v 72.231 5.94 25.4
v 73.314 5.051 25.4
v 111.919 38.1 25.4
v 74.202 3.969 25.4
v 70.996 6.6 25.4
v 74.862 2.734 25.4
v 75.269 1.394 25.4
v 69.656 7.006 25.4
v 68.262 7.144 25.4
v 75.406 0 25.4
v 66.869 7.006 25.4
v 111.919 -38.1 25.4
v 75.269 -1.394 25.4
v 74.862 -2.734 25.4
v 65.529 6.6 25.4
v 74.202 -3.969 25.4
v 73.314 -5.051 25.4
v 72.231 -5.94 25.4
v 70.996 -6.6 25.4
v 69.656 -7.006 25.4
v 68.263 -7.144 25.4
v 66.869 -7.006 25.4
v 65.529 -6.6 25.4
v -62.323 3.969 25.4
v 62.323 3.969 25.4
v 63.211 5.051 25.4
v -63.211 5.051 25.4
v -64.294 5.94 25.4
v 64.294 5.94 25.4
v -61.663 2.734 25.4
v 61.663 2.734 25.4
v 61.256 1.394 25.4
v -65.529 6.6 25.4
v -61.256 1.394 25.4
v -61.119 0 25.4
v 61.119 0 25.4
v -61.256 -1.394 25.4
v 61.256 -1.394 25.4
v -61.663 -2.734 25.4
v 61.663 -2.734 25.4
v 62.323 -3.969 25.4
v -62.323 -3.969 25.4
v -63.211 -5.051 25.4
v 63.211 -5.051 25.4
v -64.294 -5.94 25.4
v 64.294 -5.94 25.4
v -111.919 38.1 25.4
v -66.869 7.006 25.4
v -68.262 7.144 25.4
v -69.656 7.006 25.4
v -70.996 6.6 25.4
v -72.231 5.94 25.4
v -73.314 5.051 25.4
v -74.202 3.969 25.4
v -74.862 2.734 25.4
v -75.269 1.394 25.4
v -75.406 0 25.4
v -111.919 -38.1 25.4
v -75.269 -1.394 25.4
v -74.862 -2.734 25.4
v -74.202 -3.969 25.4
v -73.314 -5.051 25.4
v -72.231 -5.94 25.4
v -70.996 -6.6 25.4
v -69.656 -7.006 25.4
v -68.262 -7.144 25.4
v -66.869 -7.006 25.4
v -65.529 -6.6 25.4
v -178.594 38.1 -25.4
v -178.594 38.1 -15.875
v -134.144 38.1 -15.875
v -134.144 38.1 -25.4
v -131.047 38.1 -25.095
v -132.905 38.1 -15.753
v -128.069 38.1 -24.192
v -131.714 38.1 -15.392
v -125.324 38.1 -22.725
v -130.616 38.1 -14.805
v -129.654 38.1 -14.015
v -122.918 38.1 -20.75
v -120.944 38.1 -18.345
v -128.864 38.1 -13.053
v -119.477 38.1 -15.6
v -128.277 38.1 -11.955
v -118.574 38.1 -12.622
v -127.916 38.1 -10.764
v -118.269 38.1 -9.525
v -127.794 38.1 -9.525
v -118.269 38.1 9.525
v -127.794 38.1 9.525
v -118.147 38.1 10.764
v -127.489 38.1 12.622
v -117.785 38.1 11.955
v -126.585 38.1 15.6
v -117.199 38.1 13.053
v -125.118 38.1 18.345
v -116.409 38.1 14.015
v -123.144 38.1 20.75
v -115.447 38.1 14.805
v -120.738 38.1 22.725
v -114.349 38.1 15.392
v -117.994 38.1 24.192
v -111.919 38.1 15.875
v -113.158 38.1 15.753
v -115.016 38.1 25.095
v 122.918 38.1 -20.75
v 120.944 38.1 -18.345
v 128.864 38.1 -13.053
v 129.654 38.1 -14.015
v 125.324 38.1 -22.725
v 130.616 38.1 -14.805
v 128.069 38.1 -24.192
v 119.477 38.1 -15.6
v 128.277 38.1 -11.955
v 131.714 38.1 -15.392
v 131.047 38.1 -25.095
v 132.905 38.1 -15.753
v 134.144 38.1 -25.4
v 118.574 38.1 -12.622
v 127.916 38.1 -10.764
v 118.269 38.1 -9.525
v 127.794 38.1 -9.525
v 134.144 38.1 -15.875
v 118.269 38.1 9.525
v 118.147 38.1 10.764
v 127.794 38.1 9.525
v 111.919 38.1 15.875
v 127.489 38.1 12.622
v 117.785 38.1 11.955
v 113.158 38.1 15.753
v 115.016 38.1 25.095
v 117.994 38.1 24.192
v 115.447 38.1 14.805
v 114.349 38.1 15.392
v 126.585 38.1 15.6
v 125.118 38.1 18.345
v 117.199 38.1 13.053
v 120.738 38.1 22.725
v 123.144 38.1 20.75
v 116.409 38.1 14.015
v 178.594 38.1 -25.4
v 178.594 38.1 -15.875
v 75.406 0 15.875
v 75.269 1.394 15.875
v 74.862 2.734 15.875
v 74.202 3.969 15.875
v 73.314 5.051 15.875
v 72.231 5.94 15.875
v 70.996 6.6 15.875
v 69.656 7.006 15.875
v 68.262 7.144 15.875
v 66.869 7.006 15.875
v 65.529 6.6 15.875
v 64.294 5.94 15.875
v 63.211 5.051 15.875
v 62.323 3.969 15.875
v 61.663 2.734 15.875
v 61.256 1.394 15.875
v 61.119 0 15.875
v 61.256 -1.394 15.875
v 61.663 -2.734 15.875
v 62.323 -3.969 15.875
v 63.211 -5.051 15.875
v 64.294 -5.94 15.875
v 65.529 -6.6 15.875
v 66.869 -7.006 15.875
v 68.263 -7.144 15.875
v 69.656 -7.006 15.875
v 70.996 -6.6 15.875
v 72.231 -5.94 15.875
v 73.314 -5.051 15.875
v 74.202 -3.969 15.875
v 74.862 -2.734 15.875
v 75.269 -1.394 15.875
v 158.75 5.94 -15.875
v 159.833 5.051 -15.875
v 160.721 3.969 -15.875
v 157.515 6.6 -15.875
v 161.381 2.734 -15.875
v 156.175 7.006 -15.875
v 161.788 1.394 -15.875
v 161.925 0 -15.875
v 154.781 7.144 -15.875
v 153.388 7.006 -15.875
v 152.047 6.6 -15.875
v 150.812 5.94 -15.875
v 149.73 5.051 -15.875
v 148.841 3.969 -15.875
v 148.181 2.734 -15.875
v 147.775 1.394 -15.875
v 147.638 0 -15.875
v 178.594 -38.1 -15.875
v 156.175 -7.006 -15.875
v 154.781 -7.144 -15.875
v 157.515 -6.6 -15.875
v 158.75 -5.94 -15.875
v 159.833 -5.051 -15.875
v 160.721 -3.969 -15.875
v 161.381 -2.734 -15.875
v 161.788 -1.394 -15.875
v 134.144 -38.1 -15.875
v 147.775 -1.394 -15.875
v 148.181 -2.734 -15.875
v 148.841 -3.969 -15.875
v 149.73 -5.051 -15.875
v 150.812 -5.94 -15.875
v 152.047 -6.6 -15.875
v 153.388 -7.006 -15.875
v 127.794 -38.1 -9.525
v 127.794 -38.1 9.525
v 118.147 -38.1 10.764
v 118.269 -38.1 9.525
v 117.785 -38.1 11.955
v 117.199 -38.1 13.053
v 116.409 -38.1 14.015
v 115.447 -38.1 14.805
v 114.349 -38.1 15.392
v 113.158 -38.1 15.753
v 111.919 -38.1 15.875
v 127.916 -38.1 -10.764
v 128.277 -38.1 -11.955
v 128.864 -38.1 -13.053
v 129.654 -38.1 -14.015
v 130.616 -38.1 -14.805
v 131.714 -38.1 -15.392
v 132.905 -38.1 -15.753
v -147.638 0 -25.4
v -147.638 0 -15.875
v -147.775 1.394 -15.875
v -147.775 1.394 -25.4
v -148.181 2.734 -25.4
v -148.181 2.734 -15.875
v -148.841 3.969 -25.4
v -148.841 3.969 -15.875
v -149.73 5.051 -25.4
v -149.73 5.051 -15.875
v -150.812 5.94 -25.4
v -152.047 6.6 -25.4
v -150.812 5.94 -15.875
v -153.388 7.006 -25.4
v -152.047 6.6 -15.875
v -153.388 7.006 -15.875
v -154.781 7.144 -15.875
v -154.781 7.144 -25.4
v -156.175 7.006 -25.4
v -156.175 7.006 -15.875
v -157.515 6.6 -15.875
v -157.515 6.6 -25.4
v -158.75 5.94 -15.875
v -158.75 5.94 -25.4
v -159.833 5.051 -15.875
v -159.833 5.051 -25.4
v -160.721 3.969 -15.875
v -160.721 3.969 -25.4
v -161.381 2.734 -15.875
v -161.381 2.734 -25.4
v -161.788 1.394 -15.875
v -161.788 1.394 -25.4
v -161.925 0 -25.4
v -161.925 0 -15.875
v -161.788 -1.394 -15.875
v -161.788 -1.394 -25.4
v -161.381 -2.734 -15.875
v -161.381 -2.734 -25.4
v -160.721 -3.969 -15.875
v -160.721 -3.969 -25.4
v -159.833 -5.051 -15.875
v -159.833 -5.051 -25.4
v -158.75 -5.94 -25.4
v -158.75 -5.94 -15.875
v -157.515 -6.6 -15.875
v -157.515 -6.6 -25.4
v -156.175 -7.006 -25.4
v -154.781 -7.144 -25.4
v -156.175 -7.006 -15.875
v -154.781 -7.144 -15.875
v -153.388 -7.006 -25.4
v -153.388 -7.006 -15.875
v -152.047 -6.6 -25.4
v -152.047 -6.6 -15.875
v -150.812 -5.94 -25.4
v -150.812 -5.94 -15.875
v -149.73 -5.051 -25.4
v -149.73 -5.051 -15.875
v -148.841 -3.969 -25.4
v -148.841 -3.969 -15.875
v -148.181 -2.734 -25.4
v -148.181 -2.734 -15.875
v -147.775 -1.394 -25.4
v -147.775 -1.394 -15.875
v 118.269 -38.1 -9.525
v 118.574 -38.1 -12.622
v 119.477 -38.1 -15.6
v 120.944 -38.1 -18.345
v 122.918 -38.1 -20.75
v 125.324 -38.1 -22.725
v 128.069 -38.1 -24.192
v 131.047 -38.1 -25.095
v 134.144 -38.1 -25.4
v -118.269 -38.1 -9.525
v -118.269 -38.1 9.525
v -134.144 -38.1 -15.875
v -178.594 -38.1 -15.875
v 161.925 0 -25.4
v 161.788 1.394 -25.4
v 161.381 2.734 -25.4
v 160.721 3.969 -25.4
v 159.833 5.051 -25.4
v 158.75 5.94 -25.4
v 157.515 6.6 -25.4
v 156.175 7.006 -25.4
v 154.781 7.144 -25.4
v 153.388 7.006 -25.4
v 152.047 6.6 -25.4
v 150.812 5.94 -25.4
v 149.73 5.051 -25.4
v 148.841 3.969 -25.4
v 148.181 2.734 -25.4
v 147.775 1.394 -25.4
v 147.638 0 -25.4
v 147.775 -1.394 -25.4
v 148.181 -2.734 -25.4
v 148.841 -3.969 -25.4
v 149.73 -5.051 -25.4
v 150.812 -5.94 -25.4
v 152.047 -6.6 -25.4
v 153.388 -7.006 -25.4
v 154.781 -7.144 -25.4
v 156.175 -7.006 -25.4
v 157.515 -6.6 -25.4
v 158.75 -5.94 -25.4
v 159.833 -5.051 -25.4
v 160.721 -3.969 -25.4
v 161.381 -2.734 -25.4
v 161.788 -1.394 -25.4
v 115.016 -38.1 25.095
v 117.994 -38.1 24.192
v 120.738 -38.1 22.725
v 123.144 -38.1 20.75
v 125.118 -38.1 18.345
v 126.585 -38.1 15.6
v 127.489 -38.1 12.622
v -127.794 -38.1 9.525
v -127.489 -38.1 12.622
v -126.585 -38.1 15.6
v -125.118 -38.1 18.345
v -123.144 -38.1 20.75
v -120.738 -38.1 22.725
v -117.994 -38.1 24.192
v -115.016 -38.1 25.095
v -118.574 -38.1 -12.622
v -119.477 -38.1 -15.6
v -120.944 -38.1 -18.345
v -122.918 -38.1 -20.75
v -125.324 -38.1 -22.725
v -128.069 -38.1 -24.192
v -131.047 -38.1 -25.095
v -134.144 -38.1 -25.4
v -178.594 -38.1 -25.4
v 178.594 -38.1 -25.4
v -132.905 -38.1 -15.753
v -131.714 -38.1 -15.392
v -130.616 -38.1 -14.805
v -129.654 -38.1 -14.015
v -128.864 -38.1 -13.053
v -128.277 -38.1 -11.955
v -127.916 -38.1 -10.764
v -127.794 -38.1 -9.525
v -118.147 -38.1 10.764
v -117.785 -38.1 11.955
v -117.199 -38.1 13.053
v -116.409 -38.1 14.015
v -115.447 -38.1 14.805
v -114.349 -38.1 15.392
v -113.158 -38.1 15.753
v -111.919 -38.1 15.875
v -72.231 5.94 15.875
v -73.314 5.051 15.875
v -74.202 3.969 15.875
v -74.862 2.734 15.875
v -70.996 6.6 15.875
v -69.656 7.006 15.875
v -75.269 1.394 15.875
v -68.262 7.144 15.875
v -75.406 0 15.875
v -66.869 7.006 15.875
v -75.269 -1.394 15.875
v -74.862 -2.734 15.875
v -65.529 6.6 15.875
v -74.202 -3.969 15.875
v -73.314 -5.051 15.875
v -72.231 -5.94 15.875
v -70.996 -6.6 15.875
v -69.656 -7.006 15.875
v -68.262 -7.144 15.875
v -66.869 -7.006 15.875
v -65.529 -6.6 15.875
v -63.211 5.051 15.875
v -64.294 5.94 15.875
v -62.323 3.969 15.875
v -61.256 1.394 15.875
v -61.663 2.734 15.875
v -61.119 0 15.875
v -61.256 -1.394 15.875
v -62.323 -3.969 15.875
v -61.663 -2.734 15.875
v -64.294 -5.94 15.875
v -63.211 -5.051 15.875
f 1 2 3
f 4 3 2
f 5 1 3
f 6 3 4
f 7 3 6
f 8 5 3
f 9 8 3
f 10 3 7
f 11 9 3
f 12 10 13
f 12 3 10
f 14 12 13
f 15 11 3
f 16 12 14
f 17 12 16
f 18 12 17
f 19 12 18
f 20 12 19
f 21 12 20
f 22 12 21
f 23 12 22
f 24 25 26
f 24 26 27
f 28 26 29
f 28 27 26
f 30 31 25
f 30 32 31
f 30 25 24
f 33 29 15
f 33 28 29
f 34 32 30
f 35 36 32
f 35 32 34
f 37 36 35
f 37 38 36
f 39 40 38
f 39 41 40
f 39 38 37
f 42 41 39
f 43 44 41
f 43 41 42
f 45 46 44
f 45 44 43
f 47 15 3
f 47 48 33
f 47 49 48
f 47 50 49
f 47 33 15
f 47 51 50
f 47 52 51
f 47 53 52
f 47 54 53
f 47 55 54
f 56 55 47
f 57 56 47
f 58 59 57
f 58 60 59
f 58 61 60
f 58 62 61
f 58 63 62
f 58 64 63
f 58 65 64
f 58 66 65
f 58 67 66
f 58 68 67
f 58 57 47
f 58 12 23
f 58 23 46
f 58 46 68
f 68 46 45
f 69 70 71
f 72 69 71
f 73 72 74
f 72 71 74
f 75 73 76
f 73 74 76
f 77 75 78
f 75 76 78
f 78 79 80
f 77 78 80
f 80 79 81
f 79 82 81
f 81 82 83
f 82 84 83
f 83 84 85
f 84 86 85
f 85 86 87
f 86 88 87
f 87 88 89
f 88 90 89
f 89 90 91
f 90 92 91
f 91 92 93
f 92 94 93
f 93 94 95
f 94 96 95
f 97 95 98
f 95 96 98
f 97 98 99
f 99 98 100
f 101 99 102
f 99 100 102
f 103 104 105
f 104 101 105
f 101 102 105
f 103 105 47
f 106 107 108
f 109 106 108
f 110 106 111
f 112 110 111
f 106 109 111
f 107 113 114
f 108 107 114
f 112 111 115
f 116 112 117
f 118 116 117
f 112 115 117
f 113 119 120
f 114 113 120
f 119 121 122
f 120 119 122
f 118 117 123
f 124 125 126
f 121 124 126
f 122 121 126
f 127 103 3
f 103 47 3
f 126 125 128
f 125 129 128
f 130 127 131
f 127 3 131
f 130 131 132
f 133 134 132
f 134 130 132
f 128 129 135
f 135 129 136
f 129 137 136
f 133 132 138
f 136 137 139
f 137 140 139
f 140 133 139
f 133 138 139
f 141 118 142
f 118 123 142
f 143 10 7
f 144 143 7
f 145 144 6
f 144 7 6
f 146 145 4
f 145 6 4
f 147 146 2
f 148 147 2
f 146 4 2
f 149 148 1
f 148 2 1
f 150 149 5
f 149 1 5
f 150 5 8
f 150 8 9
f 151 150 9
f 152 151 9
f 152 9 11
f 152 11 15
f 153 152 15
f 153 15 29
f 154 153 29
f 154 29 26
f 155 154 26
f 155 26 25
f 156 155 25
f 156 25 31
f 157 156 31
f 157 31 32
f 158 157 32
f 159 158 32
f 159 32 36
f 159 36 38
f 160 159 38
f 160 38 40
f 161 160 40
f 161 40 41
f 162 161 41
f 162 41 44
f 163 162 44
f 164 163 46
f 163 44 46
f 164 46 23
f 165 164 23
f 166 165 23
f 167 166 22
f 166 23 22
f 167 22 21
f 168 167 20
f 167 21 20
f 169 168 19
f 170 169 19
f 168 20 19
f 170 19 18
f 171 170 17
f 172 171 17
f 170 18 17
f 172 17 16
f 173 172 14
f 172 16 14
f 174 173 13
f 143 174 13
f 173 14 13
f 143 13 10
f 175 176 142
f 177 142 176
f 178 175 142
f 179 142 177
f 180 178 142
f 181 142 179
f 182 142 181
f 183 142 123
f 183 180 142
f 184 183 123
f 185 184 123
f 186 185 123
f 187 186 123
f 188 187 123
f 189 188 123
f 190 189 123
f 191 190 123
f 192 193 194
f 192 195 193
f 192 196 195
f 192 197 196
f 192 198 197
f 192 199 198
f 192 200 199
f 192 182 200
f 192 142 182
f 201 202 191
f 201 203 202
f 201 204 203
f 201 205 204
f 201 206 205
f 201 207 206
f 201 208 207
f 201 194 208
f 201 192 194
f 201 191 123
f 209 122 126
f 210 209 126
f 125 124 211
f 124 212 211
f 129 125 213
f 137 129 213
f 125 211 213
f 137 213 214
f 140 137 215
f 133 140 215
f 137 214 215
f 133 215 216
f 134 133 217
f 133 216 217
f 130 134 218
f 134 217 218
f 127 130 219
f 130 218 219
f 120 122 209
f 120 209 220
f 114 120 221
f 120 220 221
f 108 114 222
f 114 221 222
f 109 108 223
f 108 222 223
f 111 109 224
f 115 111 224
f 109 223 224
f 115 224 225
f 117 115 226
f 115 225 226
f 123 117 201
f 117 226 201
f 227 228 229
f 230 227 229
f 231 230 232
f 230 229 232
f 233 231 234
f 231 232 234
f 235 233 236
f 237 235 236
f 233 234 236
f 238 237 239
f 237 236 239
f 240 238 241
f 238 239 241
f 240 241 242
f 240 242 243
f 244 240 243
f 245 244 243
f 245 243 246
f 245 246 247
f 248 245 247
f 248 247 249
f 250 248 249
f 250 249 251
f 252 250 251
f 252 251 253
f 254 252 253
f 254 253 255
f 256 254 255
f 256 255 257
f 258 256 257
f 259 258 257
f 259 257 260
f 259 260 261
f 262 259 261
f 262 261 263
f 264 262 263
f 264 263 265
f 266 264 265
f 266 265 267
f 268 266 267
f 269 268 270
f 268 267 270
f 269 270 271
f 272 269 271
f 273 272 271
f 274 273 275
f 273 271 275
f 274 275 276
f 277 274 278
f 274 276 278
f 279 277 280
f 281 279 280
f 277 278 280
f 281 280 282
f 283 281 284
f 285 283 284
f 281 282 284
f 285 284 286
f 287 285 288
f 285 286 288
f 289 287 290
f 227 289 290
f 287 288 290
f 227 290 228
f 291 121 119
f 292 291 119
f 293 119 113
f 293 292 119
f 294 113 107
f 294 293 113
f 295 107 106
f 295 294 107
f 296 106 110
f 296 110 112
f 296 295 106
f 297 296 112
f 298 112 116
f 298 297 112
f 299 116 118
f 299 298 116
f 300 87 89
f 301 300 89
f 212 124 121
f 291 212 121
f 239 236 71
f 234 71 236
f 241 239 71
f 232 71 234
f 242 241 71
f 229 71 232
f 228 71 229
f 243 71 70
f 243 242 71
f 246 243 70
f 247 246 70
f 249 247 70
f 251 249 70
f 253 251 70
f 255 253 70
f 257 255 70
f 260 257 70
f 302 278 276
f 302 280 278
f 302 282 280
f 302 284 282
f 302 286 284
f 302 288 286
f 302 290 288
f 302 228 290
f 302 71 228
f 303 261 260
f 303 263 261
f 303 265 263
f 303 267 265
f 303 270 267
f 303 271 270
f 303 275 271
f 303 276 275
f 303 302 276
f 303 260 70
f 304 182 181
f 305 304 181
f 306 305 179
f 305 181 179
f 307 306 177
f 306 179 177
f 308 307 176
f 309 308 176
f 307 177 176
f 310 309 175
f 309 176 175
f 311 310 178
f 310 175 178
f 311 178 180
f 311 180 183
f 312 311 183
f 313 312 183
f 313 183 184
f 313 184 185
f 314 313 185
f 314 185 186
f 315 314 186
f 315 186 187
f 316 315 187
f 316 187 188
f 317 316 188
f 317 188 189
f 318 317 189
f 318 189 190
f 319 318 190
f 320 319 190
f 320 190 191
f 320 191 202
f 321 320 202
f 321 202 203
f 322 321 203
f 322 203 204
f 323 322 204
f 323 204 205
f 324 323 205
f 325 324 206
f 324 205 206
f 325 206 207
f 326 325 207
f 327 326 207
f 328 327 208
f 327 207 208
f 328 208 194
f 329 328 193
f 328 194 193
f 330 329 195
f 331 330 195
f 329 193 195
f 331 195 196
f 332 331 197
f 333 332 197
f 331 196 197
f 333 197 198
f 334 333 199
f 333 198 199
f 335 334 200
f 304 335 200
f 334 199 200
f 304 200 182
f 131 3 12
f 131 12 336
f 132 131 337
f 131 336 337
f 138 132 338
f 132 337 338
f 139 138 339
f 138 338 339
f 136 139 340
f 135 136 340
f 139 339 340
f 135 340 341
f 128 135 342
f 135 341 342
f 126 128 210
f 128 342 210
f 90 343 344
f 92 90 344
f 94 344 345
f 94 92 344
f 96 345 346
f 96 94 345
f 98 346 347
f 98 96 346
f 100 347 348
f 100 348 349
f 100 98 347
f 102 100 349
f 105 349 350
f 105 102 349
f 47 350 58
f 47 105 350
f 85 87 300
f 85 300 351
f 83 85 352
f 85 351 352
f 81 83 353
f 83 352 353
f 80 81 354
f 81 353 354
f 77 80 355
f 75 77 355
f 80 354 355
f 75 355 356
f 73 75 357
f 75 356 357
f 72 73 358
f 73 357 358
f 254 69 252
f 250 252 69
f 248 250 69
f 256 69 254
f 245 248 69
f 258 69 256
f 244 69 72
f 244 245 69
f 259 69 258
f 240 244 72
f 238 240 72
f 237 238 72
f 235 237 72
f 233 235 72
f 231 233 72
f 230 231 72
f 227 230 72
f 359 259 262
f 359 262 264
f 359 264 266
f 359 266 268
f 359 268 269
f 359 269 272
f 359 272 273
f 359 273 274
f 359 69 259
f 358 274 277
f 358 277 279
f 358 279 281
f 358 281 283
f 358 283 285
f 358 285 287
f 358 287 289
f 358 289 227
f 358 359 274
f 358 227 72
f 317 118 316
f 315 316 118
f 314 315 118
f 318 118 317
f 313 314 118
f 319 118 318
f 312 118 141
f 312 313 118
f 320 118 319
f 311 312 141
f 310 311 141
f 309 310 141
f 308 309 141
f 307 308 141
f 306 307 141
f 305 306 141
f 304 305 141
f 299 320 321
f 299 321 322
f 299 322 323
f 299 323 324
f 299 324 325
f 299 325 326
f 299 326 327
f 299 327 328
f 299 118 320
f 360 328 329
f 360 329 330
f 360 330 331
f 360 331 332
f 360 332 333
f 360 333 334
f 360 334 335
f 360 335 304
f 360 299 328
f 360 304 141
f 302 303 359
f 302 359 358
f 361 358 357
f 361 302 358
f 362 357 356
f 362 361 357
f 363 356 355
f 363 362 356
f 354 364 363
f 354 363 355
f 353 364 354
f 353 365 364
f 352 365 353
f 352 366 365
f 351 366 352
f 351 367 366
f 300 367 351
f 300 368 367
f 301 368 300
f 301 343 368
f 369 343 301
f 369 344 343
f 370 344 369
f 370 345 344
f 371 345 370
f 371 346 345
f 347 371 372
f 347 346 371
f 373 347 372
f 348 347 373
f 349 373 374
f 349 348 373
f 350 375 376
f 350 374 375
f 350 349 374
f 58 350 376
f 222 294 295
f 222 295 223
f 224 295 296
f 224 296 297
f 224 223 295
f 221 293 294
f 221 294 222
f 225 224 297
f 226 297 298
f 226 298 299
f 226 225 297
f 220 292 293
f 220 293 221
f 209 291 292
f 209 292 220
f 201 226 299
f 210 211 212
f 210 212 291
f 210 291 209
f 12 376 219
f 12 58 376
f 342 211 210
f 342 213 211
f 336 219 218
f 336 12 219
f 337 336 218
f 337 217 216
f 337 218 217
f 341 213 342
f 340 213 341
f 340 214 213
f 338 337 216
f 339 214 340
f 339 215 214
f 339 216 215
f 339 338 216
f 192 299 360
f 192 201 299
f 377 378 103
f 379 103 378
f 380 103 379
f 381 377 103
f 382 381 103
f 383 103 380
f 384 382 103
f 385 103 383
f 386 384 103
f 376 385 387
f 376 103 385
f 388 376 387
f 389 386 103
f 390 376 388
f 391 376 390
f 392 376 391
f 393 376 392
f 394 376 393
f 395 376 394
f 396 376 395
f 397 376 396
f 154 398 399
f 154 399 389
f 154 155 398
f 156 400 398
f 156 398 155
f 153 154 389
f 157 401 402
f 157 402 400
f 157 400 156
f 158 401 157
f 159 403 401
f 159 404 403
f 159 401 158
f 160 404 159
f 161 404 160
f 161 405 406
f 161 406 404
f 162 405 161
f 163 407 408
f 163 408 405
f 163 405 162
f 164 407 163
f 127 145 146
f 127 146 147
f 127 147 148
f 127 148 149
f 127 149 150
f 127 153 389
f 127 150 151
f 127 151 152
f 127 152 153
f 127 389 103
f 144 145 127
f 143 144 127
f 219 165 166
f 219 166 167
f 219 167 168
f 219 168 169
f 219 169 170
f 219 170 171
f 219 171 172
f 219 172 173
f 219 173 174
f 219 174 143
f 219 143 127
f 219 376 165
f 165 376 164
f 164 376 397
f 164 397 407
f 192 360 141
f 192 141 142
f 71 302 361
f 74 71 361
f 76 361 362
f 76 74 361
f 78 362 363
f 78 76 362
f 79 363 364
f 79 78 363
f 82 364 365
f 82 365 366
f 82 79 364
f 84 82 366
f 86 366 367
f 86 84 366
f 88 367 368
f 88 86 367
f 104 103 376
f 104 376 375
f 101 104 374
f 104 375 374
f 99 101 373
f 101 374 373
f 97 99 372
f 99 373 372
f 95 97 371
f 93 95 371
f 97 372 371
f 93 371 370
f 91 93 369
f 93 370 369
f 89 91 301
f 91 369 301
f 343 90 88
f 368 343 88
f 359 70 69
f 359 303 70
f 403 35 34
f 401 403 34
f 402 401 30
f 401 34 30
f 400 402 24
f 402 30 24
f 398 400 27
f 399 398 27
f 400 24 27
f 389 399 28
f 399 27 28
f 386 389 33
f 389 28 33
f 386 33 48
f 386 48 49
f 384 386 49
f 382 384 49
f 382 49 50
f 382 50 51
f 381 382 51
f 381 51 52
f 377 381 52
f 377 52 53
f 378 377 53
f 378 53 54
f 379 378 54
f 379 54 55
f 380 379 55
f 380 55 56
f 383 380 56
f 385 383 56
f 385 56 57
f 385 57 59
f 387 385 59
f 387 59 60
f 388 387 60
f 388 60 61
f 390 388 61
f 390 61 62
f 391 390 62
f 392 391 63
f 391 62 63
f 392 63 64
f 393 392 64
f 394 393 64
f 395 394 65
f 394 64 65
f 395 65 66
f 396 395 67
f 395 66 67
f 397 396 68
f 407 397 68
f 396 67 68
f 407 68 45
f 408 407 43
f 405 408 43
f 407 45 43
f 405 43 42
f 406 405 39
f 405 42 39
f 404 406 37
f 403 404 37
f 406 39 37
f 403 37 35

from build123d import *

# Parameters (mm, degrees)
F1_DEPTH = 38.1
F2_R     = 6.35
F3_R     = 15.875
F4_R     = 7.14375
F5_DEPTH = 25.4
F6_R     = 7.14375
F7_DEPTH = 25.4


with BuildPart() as f1:
    # F0 (on Front) → F1 (new body, symmetric)
    with BuildSketch(Plane.XZ):
        Polygon((-178.59375, -15.875), (-178.59375, -25.4), (-118.26875, -25.4), (-118.26875, 15.875), (118.26875, 15.875), (118.26875, -25.4), (178.59375, -25.4), (178.59375, -15.875), (127.79375, -15.875), (127.79375, 25.4), (-127.79375, 25.4), (-127.79375, -15.875), align=None)
    extrude(amount=F1_DEPTH, both=True)

    # F2
    f2_edges = [f1.edges().sort_by_distance(p)[0] for p in [
        (-127.79375, 0, -15.875),
        (-118.26875, 0, 15.875),
        (118.26875, 0, 15.875),
        (127.79375, 0, -15.875),
    ]]
    fillet(f2_edges, radius=F2_R)

    # F3
    f3_edges = [f1.edges().sort_by_distance(p)[0] for p in [
        (-127.79375, 0, 25.4),
        (127.79375, 0, 25.4),
        (118.26875, 0, -25.4),
        (-118.26875, 0, -25.4),
    ]]
    fillet(f3_edges, radius=F3_R)

    # F4 (on face) → F5 (cut)
    with BuildSketch(Plane.XY.offset(25.4)):
        with Locations((-68.2625, 0)):
            Circle(F4_R)
        with Locations((68.2625, 0)):
            Circle(F4_R)
    extrude(amount=-F5_DEPTH, mode=Mode.SUBTRACT)

    # F6 (on face) → F7 (cut)
    with BuildSketch(Plane.XY.offset(-15.875)):
        with Locations((-154.78125, 0)):
            Circle(F6_R)
        with Locations((154.78125, 0)):
            Circle(F6_R)
    extrude(amount=-F7_DEPTH, mode=Mode.SUBTRACT)


solid = f1.part
